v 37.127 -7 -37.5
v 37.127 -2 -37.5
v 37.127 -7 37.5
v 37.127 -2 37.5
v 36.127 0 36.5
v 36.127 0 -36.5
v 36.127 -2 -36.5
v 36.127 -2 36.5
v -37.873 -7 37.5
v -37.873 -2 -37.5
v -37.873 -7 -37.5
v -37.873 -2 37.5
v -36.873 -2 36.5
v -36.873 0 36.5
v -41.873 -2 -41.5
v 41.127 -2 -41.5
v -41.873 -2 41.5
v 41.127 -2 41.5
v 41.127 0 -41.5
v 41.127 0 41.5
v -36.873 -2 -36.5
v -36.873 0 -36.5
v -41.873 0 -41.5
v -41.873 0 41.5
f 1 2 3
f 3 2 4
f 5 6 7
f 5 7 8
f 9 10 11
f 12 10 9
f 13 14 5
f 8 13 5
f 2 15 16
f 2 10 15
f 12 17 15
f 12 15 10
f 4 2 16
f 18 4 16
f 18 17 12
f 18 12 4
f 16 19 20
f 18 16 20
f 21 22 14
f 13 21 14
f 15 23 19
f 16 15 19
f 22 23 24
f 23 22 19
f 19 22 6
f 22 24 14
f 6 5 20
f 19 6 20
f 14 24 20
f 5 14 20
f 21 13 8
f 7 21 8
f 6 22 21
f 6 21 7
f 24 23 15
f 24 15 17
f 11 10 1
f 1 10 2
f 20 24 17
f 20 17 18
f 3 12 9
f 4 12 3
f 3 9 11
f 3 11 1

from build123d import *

# Parameters (mm, degrees)
F1_W     = 83
F1_H     = 83
F1_W_2   = 73
F1_H_2   = 73
F2_DEPTH = 2
F3_W     = 75
F3_H     = 75
F4_DEPTH = 5


# Not quite as in the source:
# - a feature names something its author has since deleted; it is built from what else it names


with BuildPart() as f2:
    # F1 (on Front) → F2 (new body)
    with BuildSketch(Plane.XZ):
        with Locations((-0.3727272727, 0)):
            Rectangle(F1_W, F1_H)
        with Locations((-0.3727272727, 0)):
            Rectangle(F1_W_2, F1_H_2, mode=Mode.SUBTRACT)
    extrude(amount=F2_DEPTH)

    # F3 (on face) → F4 (join)
    with BuildSketch(Plane.XZ.offset(2)):
        with Locations((-0.3727272727, 0)):
            Rectangle(F3_W, F3_H)
    extrude(amount=F4_DEPTH)


solid = f2.part
